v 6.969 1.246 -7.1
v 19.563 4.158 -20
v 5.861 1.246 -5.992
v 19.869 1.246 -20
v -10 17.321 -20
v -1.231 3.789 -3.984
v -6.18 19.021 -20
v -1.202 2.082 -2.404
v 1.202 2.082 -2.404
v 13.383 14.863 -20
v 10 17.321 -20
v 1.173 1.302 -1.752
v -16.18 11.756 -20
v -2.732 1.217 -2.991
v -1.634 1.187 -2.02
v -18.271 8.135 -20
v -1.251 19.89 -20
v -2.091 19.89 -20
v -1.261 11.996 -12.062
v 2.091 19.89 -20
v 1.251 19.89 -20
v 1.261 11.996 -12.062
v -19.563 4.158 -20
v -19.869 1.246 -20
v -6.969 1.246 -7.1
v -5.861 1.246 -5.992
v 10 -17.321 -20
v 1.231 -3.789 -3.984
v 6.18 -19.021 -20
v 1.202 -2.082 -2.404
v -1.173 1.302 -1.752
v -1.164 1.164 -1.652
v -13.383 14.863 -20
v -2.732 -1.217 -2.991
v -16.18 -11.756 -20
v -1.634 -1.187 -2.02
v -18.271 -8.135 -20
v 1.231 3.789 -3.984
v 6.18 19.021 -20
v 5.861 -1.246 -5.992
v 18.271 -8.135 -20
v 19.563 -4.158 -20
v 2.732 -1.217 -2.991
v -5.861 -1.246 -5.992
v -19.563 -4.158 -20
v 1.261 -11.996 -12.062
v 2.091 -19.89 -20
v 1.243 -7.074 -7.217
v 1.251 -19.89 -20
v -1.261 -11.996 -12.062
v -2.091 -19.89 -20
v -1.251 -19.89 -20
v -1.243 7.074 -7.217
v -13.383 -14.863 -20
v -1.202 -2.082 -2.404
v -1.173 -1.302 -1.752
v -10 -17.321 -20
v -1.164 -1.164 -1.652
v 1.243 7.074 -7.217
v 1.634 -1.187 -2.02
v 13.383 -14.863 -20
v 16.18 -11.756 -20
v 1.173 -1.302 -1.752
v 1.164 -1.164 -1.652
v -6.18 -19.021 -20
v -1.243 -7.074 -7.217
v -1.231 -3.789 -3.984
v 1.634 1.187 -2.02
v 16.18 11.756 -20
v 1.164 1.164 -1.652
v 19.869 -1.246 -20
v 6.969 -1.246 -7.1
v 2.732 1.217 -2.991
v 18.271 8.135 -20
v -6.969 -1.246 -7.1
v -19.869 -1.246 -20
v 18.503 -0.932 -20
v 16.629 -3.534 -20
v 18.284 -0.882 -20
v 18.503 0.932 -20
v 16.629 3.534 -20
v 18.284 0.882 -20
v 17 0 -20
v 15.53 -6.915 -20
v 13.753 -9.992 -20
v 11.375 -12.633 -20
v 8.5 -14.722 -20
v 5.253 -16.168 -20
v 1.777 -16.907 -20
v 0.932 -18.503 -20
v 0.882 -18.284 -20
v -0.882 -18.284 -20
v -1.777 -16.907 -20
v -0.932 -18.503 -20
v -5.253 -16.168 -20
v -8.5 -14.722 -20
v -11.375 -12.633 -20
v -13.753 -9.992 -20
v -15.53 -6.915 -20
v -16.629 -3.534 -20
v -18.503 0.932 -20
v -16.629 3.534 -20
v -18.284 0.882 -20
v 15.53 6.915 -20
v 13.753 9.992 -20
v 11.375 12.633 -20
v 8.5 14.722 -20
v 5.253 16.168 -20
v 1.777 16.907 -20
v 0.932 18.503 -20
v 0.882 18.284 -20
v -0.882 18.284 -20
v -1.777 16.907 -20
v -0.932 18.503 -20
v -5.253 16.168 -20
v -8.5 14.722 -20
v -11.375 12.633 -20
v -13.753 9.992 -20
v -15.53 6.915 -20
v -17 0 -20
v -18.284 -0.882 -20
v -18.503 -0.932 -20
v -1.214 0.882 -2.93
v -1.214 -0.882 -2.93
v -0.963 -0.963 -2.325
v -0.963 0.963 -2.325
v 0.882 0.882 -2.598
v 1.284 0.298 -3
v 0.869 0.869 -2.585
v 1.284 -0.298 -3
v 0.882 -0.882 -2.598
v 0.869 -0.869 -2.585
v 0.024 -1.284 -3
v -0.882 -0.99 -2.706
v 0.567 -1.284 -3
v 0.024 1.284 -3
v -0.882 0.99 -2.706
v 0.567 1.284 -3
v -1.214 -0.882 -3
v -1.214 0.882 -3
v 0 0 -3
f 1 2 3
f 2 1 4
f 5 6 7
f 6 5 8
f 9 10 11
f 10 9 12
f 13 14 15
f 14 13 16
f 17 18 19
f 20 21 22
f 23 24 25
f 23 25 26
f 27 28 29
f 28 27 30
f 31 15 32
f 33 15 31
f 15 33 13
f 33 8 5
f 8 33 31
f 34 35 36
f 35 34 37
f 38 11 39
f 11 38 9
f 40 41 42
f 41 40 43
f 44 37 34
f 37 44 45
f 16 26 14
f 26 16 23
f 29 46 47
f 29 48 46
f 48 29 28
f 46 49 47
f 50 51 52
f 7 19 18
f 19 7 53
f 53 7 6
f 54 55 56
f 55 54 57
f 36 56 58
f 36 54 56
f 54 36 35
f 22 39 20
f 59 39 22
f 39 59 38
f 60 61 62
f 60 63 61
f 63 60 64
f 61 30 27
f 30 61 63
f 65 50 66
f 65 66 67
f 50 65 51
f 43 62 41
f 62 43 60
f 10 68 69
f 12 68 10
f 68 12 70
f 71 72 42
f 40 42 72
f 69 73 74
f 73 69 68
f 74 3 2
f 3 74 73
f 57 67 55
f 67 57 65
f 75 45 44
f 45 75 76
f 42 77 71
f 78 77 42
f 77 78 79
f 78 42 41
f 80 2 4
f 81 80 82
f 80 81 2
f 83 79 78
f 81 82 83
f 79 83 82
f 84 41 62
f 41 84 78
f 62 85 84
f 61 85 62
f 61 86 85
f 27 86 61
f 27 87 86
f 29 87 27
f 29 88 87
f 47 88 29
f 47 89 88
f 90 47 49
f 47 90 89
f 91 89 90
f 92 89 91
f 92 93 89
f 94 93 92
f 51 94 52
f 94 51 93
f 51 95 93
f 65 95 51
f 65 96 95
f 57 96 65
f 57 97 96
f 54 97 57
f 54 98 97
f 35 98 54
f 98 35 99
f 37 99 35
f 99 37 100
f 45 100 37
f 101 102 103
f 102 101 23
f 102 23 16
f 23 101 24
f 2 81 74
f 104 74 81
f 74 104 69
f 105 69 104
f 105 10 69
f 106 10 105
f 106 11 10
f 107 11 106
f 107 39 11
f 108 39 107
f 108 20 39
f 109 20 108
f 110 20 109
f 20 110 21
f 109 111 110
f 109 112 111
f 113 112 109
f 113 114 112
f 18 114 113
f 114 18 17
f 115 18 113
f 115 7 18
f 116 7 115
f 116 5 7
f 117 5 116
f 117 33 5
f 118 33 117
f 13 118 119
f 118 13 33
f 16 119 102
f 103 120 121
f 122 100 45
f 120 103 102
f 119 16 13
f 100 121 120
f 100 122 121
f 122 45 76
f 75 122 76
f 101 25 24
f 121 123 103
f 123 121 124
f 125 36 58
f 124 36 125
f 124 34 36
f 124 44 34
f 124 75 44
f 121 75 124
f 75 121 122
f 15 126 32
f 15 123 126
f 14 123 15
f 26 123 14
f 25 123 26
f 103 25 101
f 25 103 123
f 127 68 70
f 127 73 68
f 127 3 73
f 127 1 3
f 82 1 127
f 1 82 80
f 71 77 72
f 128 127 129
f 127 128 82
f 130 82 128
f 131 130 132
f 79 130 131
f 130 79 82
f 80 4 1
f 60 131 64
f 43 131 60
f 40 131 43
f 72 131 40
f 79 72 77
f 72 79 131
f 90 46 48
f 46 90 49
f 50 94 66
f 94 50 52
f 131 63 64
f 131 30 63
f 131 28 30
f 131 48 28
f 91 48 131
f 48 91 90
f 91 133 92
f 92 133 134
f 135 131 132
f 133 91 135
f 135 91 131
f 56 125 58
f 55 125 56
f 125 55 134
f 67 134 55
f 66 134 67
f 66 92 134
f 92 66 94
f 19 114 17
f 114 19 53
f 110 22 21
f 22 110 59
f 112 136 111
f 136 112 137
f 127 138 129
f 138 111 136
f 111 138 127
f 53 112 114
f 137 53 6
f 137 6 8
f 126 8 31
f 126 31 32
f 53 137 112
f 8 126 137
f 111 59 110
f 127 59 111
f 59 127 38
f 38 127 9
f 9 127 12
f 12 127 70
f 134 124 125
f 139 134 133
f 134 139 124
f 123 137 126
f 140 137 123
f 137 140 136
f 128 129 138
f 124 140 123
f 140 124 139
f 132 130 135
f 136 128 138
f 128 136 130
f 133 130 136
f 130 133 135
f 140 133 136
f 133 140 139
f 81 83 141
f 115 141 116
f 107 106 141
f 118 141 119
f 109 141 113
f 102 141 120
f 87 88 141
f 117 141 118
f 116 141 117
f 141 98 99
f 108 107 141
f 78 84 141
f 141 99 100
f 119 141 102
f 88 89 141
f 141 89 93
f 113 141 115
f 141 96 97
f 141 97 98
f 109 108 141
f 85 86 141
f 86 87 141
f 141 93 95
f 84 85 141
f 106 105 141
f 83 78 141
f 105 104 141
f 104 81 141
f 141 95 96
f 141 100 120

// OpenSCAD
module quarterwave_holder_soldered(){
    render()difference(){
        translate([0,0,-10])cylinder(h=20, r1=20, r2=0, center=true);
    
        translate([0,0,0])rotate(a=-135,v=[0,1,0])color("yellow")cylinder(h=30,r=1.5);
   
        mirror([1,0,0])translate([0,0,0])rotate(a=-135,v=[0,1,0])color("yellow")cylinder(h=30,r=1.5);
    
        rotate(a=90,v=[0,0,1])translate([0,0,0])rotate(a=-135,v=[0,1,0])color("yellow")cylinder(h=30,r=1.5);
    
        rotate(a=-90,v=[0,0,1])translate([0,0,0])rotate(a=-135,v=[0,1,0])color("yellow")cylinder(h=30,r=1.5);
        
         translate([0,0,0-3])cylinder(h=30,r=1.5);
        
        translate([0,0,-13])cylinder(h=20, r1=20, r2=0, center=true);    }
    
   
}

quarterwave_holder_soldered();
